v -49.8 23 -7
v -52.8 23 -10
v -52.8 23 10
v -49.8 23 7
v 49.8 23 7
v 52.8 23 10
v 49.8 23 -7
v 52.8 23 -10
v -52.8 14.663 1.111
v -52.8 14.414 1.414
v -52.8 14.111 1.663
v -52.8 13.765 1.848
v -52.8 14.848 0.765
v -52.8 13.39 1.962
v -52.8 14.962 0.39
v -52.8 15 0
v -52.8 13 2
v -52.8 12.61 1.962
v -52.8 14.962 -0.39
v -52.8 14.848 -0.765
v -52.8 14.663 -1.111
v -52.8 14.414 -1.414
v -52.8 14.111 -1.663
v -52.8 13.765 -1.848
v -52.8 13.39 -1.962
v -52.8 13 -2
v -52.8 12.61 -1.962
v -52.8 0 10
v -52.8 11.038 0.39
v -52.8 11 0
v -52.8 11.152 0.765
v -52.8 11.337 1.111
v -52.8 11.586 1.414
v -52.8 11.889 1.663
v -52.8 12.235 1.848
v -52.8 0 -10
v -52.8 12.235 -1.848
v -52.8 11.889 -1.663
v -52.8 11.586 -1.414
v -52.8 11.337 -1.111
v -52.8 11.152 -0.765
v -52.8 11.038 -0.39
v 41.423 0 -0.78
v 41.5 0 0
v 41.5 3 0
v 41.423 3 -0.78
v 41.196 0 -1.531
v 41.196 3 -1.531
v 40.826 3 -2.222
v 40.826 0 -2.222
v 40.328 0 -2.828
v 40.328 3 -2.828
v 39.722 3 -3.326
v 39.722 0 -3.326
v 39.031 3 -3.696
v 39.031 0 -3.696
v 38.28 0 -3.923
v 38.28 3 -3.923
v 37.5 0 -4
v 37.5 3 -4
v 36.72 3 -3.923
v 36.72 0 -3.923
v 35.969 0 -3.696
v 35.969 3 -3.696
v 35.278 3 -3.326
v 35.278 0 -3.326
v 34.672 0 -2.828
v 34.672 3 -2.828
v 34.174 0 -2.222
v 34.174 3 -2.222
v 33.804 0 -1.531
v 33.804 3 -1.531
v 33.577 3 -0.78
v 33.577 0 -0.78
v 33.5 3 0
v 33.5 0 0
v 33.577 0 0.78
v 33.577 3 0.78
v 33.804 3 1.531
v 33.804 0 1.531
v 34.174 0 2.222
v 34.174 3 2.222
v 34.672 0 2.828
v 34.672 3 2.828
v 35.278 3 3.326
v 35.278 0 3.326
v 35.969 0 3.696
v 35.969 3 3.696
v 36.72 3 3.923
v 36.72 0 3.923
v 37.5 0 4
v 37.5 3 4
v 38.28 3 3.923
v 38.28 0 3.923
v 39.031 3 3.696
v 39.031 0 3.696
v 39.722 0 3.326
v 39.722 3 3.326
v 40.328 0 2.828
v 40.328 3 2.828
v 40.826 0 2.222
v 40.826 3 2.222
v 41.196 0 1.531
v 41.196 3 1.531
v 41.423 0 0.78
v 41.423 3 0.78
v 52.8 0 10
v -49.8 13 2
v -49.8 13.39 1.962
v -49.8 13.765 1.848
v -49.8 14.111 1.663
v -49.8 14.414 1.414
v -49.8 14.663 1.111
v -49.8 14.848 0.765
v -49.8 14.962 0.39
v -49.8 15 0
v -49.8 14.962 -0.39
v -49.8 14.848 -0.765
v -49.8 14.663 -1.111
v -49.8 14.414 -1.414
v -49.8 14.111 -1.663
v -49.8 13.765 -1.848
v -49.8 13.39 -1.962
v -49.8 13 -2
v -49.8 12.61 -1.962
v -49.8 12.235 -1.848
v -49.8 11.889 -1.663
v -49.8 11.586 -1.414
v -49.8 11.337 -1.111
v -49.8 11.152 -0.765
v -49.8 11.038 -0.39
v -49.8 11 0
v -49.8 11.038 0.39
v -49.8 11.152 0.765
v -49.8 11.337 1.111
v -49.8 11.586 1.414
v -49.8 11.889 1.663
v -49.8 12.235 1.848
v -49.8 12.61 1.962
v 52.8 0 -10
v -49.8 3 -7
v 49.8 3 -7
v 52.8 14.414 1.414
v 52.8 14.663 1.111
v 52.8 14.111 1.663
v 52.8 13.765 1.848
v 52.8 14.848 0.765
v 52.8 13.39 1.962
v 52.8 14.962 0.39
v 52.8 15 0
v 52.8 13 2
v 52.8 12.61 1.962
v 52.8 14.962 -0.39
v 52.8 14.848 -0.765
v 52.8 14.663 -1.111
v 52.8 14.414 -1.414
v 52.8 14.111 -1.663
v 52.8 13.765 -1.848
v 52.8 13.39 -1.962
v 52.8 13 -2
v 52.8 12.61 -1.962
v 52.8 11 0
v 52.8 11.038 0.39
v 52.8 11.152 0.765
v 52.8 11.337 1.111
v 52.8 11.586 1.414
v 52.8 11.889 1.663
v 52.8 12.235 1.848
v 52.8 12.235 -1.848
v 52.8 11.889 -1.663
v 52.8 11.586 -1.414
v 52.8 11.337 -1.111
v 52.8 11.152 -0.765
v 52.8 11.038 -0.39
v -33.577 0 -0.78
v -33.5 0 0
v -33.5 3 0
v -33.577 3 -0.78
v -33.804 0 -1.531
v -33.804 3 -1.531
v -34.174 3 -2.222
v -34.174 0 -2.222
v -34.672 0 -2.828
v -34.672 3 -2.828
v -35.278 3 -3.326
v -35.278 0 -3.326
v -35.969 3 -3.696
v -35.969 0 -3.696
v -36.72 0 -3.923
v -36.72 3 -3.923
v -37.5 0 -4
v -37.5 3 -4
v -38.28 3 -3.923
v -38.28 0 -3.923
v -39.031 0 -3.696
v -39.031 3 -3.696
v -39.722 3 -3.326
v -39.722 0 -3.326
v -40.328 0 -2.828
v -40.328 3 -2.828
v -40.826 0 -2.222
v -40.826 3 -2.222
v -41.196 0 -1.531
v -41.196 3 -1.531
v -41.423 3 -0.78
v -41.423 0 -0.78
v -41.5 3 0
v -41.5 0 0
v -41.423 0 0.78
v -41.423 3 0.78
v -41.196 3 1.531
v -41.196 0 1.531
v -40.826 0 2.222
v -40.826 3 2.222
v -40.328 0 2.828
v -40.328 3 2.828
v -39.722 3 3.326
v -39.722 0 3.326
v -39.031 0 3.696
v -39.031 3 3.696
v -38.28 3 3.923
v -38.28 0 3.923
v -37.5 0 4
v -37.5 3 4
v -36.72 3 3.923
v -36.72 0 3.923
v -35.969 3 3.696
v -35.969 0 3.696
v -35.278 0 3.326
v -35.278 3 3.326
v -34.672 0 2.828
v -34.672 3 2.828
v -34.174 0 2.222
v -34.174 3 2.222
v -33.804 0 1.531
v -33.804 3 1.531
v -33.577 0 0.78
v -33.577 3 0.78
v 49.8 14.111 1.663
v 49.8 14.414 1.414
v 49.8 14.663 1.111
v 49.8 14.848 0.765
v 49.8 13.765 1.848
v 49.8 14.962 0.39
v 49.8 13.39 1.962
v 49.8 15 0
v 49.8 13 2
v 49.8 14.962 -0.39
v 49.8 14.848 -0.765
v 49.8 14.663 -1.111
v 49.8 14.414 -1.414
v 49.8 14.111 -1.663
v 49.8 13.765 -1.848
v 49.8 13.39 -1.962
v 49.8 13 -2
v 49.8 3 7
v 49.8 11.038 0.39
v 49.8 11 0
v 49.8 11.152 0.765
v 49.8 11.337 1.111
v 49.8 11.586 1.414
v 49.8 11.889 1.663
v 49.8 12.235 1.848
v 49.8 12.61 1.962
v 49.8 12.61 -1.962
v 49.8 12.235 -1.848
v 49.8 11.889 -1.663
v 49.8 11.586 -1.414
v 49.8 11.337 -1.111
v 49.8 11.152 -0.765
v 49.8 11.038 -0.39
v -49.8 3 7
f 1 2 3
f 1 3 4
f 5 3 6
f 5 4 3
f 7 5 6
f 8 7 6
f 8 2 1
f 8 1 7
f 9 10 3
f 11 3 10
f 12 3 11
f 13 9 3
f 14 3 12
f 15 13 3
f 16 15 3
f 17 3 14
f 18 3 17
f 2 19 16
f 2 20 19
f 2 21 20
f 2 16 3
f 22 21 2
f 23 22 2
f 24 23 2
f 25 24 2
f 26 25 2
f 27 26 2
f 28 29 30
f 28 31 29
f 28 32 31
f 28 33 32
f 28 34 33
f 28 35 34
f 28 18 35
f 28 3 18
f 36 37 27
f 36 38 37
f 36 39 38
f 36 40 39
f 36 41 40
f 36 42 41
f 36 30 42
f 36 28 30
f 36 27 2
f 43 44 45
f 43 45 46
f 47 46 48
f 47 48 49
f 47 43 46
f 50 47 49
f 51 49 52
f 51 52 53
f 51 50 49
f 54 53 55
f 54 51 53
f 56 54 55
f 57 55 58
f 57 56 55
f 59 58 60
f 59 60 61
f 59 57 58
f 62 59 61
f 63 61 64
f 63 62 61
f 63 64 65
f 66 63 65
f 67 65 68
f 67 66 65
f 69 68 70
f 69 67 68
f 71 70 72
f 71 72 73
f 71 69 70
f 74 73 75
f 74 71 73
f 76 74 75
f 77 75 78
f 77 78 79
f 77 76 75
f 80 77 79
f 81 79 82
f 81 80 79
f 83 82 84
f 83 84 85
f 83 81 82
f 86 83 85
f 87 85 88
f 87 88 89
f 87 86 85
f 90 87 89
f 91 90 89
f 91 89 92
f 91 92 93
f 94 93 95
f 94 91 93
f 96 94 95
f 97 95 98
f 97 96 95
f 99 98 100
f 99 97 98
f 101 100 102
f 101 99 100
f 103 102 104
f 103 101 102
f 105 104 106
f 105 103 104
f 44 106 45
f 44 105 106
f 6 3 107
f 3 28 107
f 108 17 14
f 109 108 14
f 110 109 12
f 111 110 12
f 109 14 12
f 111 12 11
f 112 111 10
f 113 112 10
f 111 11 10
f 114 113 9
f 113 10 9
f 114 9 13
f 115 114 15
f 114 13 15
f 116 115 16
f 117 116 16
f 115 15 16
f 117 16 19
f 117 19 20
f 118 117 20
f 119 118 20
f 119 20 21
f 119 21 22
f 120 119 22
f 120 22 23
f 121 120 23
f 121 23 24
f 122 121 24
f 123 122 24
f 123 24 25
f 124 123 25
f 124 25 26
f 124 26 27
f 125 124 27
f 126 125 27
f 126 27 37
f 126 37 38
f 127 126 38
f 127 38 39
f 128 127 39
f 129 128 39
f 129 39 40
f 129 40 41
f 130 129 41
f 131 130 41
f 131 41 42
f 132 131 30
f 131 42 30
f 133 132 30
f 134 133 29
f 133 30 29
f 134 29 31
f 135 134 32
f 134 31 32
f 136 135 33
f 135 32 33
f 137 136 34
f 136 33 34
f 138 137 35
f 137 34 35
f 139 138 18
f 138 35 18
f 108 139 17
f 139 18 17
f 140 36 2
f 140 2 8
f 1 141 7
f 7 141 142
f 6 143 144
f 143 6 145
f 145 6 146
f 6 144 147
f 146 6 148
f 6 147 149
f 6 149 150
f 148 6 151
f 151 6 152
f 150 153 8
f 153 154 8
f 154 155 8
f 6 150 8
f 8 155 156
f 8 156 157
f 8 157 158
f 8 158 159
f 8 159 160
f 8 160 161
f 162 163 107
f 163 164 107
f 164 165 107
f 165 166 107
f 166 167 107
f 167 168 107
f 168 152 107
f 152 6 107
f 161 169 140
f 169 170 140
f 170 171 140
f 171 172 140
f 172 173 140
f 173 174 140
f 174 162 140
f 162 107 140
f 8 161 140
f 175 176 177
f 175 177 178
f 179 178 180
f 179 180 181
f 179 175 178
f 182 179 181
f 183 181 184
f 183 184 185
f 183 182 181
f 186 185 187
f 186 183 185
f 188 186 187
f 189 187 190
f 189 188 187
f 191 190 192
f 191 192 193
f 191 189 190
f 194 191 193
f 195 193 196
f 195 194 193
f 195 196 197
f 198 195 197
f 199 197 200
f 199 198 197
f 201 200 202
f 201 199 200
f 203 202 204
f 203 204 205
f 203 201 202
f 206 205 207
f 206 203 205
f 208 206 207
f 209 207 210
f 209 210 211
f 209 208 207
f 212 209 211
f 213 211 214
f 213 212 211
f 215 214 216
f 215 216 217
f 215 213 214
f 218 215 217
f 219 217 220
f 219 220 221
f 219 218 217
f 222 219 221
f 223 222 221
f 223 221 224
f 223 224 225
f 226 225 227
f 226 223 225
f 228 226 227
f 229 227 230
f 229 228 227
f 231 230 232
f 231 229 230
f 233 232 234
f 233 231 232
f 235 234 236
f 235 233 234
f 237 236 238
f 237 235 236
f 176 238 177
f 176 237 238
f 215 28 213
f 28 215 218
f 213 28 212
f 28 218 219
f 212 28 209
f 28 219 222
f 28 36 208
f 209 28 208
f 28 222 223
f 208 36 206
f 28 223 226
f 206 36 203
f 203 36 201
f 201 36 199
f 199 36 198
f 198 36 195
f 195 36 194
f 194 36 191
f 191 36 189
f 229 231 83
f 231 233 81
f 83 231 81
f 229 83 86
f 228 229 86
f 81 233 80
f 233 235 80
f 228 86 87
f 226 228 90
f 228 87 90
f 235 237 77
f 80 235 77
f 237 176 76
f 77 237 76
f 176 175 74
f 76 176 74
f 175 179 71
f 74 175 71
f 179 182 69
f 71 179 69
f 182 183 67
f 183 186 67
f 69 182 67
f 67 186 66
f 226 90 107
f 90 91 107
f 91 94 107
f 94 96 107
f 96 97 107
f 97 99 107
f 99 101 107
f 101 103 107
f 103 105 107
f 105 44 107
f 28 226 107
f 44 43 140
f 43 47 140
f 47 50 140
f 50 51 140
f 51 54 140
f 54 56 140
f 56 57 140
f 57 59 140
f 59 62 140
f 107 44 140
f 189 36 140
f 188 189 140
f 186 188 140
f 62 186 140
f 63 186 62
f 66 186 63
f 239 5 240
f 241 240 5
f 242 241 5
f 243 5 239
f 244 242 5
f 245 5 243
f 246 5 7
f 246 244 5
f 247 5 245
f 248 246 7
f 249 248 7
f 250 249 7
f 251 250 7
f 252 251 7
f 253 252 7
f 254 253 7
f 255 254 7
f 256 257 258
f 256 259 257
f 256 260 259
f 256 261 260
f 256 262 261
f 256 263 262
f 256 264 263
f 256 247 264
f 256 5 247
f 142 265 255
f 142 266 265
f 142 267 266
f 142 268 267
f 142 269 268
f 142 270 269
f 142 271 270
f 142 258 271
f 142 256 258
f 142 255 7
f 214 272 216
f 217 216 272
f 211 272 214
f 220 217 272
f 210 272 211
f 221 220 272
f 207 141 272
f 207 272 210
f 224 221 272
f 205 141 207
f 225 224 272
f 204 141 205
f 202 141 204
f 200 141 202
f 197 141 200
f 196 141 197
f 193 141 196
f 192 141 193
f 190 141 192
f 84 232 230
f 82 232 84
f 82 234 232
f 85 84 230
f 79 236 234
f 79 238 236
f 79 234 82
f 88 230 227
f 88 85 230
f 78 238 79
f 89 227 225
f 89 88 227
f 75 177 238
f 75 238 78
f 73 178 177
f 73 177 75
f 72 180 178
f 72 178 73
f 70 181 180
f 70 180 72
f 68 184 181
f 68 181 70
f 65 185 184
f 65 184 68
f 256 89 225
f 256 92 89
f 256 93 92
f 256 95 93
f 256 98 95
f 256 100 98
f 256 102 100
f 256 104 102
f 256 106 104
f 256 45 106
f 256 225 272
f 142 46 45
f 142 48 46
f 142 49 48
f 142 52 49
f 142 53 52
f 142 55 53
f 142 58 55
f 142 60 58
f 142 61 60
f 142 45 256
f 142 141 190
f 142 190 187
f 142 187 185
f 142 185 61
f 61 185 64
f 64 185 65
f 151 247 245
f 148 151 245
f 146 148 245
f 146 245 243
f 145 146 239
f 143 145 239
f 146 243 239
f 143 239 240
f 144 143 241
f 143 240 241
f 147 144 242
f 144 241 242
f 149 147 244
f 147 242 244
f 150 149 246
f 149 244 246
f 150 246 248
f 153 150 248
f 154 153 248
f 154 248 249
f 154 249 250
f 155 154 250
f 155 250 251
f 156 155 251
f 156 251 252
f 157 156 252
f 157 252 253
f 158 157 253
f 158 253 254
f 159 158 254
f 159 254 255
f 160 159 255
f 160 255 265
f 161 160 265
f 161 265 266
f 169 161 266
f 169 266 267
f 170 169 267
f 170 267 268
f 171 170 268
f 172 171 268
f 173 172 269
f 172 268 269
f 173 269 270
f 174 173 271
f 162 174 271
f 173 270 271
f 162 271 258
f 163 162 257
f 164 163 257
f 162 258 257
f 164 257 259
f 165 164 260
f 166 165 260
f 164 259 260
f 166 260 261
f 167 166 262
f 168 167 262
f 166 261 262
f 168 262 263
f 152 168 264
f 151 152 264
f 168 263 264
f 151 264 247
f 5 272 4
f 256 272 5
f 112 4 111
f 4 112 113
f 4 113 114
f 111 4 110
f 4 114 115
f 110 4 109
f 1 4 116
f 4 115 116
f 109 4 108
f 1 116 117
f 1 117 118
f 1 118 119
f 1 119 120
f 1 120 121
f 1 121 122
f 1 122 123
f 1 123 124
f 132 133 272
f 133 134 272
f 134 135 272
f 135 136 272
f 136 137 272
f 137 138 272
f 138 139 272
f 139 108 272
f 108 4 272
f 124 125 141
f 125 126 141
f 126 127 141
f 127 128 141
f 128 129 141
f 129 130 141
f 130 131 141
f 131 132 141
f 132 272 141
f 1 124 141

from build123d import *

# Parameters (mm, degrees)
SKETCH_1_W          = 105.6
SKETCH_1_H          = 20
SKETCH_1_R          = 4
EXTRUDE_1_DEPTH     = 3
SKETCH_10_W         = 105.6
SKETCH_10_H         = 20
SKETCH_10_W_2       = 99.6
SKETCH_10_H_2       = 14
EXTRUDE_2_DEPTH     = 20
SKETCH_11_R         = 2
CUT_EXTRUDE_1_DEPTH = 110


with BuildPart() as part:
    # 草图1 → 凸台-拉伸1 (new body)
    with BuildSketch(Plane(origin=(0, 0, 0), x_dir=(1, 0, 0), z_dir=(0, 1, 0))):
        Rectangle(SKETCH_1_W, SKETCH_1_H)
        with Locations((-37.5, 0)):
            Circle(SKETCH_1_R, mode=Mode.SUBTRACT)
        with Locations((37.5, 0)):
            Circle(SKETCH_1_R, mode=Mode.SUBTRACT)
    extrude(amount=EXTRUDE_1_DEPTH)

    # 草图10 → 凸台-拉伸2 (add)
    with BuildSketch(Plane(origin=(0, 3, 0), x_dir=(1, 0, 0), z_dir=(0, 1, 0))):
        Rectangle(SKETCH_10_W, SKETCH_10_H)
        Rectangle(SKETCH_10_W_2, SKETCH_10_H_2, mode=Mode.SUBTRACT)
    extrude(amount=EXTRUDE_2_DEPTH)

    # 草图11 → 切除-拉伸1 (cut)
    with BuildSketch(Plane.ZY.offset(52.8)):
        with Locations((0, 13)):
            Circle(SKETCH_11_R)
    extrude(amount=-CUT_EXTRUDE_1_DEPTH, mode=Mode.SUBTRACT)


solid = part.part
